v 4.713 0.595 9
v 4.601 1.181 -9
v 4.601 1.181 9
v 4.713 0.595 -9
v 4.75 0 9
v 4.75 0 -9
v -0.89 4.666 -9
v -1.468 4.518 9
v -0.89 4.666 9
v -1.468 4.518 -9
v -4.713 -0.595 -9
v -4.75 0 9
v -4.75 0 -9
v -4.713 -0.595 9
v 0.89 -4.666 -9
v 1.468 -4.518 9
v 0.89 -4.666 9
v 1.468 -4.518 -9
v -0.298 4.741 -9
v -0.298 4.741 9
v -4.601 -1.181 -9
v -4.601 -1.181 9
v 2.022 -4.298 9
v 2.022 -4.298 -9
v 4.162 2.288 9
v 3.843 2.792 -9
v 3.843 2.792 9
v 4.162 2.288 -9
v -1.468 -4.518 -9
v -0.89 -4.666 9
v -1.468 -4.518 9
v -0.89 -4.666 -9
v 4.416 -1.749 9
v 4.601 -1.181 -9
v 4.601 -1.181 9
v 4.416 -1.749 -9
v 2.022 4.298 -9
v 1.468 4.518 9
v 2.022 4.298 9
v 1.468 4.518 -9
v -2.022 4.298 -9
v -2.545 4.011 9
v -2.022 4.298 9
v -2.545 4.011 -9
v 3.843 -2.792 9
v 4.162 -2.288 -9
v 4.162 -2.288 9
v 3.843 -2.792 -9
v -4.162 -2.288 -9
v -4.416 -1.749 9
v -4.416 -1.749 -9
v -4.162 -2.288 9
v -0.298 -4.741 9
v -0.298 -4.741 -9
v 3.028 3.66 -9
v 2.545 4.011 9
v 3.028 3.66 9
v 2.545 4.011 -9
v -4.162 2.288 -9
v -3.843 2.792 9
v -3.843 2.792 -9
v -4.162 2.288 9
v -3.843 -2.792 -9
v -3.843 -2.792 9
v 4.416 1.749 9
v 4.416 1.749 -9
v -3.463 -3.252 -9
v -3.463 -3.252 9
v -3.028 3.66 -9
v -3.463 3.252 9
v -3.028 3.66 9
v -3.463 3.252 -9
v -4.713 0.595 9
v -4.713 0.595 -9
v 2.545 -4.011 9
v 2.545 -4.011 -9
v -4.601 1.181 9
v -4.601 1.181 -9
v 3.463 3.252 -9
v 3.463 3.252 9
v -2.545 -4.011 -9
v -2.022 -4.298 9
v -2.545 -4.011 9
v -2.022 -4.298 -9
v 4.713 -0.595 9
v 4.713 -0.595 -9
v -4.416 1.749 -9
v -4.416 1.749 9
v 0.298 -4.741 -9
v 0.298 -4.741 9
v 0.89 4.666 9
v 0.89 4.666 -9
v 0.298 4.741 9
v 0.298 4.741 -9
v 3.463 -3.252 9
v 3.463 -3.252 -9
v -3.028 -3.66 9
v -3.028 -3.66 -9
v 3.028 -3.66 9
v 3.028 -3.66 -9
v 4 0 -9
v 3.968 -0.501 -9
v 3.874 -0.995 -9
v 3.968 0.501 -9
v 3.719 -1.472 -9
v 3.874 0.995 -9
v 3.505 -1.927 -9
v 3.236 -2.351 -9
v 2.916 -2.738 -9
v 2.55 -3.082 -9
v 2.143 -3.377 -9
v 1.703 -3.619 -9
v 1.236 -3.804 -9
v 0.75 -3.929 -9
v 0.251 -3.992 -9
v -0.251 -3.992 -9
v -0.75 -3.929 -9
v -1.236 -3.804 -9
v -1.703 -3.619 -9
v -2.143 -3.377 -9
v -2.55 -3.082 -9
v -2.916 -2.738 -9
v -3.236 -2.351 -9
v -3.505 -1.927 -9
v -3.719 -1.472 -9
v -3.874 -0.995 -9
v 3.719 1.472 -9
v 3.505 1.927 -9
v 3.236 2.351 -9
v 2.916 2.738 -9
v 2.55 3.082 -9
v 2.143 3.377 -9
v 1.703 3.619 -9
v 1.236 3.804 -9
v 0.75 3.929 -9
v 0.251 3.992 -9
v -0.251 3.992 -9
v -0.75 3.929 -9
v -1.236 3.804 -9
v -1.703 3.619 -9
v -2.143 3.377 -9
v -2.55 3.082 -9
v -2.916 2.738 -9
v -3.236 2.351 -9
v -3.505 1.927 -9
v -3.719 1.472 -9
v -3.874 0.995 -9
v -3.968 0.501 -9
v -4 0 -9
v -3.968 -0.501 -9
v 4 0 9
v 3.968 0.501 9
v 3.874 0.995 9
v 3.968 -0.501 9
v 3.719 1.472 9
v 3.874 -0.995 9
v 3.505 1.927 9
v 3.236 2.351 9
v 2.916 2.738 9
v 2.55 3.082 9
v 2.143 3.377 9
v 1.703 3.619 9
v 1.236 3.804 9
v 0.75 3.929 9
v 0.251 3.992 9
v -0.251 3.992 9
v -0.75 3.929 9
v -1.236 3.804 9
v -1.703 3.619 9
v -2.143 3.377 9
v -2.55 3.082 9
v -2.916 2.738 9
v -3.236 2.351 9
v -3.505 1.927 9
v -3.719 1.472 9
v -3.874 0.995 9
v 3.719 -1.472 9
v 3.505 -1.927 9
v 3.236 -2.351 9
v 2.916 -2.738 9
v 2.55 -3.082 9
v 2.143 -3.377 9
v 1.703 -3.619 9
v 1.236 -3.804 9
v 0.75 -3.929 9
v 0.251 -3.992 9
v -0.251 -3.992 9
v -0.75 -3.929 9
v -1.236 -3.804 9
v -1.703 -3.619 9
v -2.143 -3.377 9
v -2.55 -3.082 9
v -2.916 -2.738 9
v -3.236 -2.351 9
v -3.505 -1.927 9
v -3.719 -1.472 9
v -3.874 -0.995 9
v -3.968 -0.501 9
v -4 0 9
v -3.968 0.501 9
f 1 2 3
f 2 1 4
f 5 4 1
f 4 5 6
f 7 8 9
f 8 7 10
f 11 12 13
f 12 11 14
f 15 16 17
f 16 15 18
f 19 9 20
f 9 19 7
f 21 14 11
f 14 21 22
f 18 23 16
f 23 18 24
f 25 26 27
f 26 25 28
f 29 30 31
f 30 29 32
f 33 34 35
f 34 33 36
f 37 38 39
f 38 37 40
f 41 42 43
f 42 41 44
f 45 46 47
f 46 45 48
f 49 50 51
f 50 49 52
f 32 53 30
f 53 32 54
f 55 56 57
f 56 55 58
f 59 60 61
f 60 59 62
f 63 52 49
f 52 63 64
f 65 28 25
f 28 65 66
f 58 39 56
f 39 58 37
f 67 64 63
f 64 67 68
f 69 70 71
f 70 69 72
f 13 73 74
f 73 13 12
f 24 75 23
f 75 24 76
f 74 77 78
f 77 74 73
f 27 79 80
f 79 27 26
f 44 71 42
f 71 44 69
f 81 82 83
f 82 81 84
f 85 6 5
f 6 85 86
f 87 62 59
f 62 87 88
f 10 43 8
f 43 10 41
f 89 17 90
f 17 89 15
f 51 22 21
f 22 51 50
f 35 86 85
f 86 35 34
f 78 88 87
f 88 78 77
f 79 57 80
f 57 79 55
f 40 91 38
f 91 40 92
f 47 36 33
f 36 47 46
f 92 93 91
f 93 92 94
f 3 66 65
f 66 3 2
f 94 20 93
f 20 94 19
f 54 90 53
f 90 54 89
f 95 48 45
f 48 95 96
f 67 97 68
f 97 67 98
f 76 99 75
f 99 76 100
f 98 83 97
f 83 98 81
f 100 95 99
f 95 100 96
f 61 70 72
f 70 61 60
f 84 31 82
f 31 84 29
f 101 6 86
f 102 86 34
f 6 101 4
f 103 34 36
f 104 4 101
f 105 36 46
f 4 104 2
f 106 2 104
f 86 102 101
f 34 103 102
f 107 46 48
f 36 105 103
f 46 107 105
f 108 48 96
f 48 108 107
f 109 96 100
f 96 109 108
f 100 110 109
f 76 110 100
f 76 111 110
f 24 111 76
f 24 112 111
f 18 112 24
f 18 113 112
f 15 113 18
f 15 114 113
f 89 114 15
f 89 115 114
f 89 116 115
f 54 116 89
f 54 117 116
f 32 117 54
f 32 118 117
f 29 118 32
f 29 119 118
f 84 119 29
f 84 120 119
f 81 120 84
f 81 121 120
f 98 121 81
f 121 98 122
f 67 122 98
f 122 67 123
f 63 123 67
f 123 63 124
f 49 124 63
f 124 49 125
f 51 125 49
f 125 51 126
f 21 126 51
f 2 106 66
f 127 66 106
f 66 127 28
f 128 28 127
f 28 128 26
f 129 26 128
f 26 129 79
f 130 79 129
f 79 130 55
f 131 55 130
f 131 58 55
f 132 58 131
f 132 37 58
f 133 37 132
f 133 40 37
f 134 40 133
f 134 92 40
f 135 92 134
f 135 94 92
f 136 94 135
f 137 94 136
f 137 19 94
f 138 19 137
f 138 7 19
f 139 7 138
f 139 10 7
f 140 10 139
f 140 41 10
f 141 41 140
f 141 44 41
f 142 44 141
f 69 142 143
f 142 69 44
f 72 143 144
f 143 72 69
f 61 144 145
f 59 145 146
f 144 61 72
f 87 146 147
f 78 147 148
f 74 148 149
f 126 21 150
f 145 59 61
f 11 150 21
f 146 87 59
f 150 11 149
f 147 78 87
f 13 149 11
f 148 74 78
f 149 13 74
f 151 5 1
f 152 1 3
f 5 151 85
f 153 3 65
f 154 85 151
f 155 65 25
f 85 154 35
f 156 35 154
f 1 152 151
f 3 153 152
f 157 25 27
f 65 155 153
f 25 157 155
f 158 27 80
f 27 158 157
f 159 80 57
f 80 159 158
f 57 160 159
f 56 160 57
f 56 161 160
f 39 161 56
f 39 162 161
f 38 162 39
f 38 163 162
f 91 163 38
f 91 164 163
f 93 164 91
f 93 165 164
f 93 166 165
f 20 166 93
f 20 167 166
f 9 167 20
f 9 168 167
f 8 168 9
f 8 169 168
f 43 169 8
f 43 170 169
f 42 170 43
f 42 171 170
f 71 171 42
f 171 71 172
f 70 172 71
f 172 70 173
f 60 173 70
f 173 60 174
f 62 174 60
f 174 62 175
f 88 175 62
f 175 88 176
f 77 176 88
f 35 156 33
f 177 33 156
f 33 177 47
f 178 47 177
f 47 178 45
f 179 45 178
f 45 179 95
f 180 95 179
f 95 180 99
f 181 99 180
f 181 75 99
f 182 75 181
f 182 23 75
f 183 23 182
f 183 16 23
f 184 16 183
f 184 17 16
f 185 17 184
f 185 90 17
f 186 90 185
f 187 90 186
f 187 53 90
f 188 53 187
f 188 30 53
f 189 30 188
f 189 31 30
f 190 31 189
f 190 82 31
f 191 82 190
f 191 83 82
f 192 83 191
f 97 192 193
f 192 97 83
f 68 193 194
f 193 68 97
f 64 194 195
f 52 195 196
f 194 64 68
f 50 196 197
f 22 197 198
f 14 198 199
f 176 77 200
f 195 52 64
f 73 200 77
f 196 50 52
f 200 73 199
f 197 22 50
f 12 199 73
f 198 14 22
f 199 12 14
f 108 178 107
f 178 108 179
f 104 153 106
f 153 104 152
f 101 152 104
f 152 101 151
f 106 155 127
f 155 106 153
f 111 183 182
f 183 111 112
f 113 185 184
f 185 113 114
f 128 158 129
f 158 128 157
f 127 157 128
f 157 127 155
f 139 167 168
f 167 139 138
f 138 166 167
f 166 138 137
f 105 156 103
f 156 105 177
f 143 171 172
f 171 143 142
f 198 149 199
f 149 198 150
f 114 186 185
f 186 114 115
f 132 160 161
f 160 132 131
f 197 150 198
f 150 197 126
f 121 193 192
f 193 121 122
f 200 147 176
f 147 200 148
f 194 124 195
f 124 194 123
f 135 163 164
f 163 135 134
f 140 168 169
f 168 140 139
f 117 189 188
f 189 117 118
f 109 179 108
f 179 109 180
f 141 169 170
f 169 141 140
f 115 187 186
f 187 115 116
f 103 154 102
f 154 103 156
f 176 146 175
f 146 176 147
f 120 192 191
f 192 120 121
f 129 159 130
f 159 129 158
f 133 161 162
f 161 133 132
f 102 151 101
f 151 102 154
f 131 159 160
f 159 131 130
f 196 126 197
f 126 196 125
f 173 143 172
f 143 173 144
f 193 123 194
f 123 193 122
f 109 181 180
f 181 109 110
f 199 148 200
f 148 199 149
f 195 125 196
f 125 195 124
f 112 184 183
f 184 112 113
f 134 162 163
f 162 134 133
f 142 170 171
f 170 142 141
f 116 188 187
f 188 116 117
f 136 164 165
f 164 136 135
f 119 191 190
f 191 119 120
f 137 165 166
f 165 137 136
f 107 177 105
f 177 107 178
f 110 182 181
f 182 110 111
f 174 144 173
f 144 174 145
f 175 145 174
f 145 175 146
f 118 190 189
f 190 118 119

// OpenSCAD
$fn = 50;


difference() {
	union() {
		translate(v = [0, 0, -9.0000000000]) {
			cylinder(h = 18, r = 4.7500000000);
		}
	}
	union() {
		translate(v = [0, 0, -100.0000000000]) {
			cylinder(h = 200, r = 4.0000000000);
		}
	}
}
